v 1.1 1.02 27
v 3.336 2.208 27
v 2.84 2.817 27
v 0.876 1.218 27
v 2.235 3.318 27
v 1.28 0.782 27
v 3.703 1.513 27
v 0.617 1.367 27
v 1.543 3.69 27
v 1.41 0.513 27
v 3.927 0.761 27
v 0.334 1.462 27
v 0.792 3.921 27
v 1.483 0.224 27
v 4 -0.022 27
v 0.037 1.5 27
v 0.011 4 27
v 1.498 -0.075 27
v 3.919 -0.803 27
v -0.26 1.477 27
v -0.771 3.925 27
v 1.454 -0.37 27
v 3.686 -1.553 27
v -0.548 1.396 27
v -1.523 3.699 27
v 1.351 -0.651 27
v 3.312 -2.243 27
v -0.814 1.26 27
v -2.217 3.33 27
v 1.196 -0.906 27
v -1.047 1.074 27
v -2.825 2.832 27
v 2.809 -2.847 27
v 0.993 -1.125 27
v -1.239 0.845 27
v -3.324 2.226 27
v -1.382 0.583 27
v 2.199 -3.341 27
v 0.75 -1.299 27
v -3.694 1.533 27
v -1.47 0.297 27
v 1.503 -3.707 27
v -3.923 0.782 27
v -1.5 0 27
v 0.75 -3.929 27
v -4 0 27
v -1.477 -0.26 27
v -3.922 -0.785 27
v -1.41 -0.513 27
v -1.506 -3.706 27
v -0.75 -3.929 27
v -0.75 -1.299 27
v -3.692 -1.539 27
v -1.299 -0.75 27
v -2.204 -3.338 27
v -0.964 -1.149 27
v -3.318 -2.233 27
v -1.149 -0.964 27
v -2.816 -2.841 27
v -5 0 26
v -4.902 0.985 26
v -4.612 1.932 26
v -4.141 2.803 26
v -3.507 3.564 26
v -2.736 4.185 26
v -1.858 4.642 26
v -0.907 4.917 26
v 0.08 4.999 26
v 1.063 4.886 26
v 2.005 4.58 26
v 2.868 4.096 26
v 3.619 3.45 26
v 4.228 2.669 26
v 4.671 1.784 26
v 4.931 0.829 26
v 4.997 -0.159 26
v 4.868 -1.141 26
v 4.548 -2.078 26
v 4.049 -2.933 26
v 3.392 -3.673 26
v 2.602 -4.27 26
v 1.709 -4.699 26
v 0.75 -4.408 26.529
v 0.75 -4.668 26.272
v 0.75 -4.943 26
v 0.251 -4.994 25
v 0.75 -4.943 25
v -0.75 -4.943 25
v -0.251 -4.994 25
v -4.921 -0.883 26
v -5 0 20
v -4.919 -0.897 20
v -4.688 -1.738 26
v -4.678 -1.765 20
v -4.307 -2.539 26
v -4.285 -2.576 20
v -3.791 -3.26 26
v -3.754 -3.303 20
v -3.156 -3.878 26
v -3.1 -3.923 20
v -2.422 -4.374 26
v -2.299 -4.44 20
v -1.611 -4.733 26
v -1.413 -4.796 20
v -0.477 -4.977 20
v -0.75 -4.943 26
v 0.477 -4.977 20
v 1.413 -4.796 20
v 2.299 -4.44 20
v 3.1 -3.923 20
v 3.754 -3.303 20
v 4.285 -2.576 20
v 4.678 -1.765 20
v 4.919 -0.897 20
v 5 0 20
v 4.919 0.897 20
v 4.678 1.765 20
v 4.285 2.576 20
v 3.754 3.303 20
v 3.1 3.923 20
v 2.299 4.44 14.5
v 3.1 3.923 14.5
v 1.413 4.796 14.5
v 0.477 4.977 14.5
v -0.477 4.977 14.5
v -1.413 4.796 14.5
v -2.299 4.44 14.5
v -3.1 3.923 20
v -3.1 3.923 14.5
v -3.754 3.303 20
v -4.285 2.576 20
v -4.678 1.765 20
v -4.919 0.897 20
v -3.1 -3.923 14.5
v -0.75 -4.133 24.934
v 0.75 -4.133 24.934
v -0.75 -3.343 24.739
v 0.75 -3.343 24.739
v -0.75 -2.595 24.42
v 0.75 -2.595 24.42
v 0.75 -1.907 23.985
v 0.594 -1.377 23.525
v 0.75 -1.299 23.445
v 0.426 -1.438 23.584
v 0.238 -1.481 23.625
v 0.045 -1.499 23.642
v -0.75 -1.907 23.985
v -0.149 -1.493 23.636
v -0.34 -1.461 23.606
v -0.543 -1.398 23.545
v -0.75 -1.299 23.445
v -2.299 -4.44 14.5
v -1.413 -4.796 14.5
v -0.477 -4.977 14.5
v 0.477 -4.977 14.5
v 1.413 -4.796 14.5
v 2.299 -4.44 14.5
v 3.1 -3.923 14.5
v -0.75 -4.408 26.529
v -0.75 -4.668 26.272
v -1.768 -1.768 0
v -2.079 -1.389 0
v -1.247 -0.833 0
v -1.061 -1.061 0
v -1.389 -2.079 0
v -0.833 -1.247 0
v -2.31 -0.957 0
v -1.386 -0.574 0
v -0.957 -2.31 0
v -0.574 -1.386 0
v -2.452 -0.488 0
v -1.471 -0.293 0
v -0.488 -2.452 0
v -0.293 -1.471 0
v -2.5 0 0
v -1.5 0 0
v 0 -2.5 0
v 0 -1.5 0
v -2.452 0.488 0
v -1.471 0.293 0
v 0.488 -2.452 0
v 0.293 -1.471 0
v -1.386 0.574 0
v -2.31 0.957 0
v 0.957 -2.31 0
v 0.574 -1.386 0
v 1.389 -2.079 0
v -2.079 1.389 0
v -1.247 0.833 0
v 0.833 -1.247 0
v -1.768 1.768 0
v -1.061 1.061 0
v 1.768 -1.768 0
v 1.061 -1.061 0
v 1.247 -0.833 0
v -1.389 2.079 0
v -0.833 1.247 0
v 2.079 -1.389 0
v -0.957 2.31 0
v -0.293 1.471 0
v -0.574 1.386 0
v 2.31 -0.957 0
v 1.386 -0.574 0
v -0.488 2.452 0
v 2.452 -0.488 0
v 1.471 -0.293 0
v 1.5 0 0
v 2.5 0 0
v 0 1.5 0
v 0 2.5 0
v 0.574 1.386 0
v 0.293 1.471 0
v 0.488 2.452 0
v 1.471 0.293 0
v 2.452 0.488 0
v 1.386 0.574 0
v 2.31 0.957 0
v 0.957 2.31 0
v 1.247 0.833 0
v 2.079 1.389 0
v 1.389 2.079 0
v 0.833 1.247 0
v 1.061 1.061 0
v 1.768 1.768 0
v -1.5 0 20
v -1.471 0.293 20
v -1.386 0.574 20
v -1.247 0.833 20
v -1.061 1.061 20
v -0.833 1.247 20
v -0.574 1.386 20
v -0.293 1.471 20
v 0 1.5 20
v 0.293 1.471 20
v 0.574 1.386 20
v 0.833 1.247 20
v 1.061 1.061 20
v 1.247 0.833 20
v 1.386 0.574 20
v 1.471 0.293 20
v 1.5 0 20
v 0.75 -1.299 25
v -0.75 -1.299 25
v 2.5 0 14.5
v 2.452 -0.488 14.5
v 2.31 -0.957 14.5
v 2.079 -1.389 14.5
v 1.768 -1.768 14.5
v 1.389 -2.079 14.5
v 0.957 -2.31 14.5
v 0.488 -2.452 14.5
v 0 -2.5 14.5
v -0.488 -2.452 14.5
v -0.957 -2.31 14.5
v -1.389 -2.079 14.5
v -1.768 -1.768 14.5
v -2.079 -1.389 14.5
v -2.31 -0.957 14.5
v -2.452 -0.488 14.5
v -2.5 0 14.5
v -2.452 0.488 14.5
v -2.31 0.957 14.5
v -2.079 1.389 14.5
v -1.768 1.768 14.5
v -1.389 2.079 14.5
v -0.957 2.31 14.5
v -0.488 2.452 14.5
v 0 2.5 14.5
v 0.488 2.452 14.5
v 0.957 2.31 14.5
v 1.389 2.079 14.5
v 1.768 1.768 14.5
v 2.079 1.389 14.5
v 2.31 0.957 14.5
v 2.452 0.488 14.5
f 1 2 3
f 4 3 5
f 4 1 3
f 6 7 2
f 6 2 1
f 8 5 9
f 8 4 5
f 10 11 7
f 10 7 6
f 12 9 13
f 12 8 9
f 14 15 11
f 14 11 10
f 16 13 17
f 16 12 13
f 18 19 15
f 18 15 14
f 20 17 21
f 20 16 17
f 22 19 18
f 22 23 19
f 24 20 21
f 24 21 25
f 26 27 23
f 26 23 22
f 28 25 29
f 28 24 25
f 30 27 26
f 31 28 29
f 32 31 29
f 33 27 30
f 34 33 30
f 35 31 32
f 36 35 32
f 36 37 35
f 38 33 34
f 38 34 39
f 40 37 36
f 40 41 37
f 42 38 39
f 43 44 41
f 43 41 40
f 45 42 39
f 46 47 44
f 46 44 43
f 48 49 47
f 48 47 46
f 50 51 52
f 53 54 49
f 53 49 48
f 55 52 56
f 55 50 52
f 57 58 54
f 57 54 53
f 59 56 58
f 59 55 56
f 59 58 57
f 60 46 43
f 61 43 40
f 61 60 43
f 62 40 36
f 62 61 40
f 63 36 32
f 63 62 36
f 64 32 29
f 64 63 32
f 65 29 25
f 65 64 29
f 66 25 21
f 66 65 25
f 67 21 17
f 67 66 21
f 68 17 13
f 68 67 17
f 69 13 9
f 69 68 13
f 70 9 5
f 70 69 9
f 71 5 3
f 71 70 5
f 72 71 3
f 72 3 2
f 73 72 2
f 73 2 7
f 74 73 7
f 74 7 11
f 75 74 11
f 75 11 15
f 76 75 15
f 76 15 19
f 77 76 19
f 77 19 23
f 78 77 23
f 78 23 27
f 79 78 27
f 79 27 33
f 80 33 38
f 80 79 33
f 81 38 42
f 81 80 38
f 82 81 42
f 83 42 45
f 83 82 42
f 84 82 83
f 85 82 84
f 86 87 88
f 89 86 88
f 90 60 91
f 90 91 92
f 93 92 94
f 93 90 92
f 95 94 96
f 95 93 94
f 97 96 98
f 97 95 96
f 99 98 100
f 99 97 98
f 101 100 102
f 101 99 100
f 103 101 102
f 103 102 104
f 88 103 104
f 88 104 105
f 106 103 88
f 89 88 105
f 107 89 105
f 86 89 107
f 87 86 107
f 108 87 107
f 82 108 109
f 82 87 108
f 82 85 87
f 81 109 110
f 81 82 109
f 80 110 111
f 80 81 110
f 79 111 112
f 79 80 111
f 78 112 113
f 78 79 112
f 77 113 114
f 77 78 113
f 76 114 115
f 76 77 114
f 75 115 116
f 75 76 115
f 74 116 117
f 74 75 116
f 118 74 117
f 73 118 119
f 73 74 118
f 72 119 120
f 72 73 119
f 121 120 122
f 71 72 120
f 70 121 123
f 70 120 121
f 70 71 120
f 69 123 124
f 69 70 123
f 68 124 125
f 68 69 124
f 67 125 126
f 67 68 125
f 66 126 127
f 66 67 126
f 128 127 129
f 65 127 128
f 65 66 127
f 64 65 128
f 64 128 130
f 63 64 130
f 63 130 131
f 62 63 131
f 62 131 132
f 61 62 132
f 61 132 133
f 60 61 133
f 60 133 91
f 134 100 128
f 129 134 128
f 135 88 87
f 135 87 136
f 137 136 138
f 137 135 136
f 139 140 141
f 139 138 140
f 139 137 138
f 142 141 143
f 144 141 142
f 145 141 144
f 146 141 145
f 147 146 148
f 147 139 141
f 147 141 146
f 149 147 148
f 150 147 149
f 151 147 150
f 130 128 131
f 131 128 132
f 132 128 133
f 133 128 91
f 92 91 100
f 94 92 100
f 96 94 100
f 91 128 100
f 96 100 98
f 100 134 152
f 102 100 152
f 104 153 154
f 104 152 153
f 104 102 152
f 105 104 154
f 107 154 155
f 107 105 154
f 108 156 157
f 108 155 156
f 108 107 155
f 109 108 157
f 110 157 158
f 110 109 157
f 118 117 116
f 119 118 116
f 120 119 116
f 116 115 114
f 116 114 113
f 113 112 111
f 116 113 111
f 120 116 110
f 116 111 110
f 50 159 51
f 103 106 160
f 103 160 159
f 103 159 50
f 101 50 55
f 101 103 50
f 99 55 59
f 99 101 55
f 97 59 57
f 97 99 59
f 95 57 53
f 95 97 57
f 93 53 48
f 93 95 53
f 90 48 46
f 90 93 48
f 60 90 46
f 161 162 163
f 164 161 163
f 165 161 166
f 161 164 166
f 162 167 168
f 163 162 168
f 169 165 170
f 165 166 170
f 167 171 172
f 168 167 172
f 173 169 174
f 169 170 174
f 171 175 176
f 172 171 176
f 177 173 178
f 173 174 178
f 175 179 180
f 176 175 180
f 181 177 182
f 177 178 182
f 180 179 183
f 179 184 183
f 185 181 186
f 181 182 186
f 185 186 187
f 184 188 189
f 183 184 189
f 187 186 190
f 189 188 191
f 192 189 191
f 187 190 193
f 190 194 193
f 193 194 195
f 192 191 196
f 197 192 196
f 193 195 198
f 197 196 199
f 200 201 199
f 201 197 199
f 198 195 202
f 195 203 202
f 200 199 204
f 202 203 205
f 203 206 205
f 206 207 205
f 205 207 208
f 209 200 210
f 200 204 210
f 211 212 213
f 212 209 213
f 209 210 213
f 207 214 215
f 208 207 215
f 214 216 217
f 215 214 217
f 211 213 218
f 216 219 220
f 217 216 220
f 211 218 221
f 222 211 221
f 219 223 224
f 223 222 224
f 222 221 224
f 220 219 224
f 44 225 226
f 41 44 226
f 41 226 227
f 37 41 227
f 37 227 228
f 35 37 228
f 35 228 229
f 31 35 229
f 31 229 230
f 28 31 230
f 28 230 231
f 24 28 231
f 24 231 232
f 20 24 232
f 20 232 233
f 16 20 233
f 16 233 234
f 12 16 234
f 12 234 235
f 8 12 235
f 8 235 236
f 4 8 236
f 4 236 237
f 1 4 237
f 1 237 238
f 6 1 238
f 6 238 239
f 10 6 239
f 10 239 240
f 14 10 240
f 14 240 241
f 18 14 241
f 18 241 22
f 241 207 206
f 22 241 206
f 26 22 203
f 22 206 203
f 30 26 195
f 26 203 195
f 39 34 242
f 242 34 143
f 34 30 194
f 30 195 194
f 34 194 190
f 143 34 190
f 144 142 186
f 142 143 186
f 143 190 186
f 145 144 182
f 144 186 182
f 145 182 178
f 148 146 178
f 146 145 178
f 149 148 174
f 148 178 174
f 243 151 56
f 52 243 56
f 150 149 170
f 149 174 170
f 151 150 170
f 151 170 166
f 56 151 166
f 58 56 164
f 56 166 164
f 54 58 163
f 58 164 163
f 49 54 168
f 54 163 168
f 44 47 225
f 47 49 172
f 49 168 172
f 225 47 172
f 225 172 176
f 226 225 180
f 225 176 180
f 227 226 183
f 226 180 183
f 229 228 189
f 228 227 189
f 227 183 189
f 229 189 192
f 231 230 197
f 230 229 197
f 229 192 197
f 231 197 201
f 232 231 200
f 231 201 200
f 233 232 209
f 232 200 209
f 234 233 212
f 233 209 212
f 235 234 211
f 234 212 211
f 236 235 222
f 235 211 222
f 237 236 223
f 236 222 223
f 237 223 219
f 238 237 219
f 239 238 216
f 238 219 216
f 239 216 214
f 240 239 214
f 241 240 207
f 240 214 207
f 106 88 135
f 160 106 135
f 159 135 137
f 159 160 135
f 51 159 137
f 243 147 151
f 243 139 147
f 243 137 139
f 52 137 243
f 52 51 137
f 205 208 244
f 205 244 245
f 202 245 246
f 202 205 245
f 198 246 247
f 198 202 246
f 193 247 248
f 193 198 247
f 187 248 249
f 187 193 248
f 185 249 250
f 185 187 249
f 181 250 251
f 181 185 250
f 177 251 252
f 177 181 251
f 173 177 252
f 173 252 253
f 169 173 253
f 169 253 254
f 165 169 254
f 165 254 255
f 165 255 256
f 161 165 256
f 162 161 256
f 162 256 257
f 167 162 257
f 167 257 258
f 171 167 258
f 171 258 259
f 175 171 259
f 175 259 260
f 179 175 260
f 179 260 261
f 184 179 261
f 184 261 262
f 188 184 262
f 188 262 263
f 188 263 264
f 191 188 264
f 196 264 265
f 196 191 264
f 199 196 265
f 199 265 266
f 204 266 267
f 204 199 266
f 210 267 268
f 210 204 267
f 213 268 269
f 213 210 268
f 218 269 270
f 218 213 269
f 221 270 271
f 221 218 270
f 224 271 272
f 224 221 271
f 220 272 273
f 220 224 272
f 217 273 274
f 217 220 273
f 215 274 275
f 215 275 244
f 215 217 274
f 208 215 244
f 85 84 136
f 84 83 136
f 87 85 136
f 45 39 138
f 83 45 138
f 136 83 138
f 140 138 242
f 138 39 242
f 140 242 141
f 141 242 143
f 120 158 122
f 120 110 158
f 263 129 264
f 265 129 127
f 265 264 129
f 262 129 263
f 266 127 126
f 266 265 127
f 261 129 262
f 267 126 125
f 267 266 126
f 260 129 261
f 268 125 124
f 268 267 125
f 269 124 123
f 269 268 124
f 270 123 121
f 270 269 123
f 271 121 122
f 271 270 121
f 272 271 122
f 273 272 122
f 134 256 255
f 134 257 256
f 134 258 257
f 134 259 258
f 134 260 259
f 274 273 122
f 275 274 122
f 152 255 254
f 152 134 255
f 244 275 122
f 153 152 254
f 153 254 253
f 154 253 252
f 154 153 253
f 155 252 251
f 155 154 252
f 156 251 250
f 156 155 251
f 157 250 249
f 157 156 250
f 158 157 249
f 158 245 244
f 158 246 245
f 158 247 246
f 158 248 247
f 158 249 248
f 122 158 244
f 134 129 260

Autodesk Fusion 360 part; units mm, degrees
sketch "Sketch1" plane through (0, 0, 0) normal (0, 0, 1) x (1, 0, 0)
  circle A0 centre (0, 0) radius 2.5
  circle A1 centre (0, 0) radius 1.5
  dimension "d1" = 5
  dimension "d2" = 3
extrude "Extrude1" add sketch "Sketch1" along normal blind 20
sketch "Sketch2" plane through (0, 0, 20) normal (0, 0, 1) x (-1, 0, 0)
  circle A0 centre (0, 0) radius 1.5
  circle A1 centre (0, 0) radius 2.5
  circle A2 centre (0, 0) radius 5
  dimension "d5" = 2.5
extrude "Extrude2" add sketch "Sketch2" along normal blind 7 contours A1 | A2
sketch "Sketch3" plane through (0, 0, 0) normal (0, 1, 0) x (1, 0, 0)
  line L0 (-5, -27) -> (5, -27)
  line L1 (0, -27) -> (0, -20) construction
  line L2 (-5, -20) -> (5, -20)
  line L3 (-0.75, -27) -> (0.75, -27)
  line L4 (0.75, -27) -> (0.75, -25)
  line L5 (0.75, -25) -> (-0.75, -25)
  line L6 (-0.75, -25) -> (-0.75, -27)
  dimension "d8" = 1.5
  dimension "d9" = 2
extrude "Extrude3" cut sketch "Sketch3" against normal blind 6
sketch "Sketch4" plane through (0, 0, 0) normal (1, 0, 0) x (0, 1, 0)
  line L0 (-1.299, 27) -> (-4.9434, 27)
  line L1 (-1.299, 27) -> (1.5, 27)
  line L2 (-1.299, 25) -> (-4.9434, 25)
  line L3 (-1.299, 25) -> (-1.299, 23.4446)
  arc A0 (-1.299, 23.4446) -> (-4.9434, 25) centre (-4.9434, 19.9527) ccw
extrude "Extrude4" cut sketch "Sketch4" along normal blind 0.75 and the other way blind 0.75
chamfer "Chamfer1" distance 1 angle 45 1 edges at (0, 5, 27)
sketch "Sketch5" plane through (0, 0, 20) normal (0, 0, -1) x (1, 0, 0)
  circle A0 centre (0, 0) radius 5
  circle A1 centre (0, 0) radius 2.5
  circle A2 centre (0, 0) radius 5
  line L0 (-3.1, 3.923) -> (-3.1, -3.923)
  line L1 (3.1, 3.923) -> (3.1, -3.923)
  line L2 (0, -5) -> (0, 5) construction
  dimension "d19" = 6.2
extrude "Extrude5" add sketch "Sketch5" along normal blind 5.5 contours A0 A2 L0 L1
